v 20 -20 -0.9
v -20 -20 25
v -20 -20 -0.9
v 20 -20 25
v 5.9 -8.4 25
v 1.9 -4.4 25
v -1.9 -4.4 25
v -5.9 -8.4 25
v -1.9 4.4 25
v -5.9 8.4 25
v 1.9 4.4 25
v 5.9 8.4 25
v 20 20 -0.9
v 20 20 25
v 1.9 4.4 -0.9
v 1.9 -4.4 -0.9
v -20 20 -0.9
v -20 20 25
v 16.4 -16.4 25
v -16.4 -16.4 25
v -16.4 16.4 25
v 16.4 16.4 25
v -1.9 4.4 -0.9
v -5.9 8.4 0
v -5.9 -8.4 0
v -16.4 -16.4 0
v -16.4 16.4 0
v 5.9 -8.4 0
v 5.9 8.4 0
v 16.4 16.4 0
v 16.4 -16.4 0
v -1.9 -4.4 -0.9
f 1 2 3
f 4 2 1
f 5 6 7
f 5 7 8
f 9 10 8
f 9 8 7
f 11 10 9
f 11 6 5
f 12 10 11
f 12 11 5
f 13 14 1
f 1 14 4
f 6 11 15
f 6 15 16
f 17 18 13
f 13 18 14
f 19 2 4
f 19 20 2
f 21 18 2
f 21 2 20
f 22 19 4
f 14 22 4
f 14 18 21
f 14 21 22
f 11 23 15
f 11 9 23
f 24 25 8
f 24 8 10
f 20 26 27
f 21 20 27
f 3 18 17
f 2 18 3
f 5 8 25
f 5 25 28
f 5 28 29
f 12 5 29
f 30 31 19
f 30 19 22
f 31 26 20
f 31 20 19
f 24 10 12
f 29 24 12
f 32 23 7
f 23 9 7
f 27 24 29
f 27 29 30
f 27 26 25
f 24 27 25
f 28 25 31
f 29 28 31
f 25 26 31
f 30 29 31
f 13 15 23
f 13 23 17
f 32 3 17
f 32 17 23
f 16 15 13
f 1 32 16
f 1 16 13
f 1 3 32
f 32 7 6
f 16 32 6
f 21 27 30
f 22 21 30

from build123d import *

# Parameters (mm, degrees)
F0_W     = 40
F0_H     = 40
F0_W_2   = 32.8
F0_H_2   = 32.8
F1_DEPTH = 25
F2_W     = 11.8
F2_H     = 16.8
F2_W_2   = 3.8
F2_H_2   = 8.8
F3_DEPTH = 25
F4_W     = 40
F4_H     = 40
F4_W_2   = 3.8
F4_H_2   = 8.8
F5_DEPTH = 0.9


with BuildPart() as f1:
    # F0 (on Top) → F1 (new body)
    with BuildSketch(Plane.XY):
        Rectangle(F0_W, F0_H)
        Rectangle(F0_W_2, F0_H_2, mode=Mode.SUBTRACT)
    extrude(amount=F1_DEPTH)



with BuildPart() as f3:
    # F2 (on Top) → F3 (new body)
    with BuildSketch(Plane.XY):
        Rectangle(F2_W, F2_H)
        Rectangle(F2_W_2, F2_H_2, mode=Mode.SUBTRACT)
    extrude(amount=F3_DEPTH)


with BuildPart() as f1_1:
    add(f1.part)

    add(f3.part)  # F5 merges F3
    # F4 (on face) → F5 (join)
    with BuildSketch(Plane(origin=(0, 0, 0), x_dir=(1, 0, 0), z_dir=(0, 0, -1))):
        Rectangle(F4_W, F4_H)
        Rectangle(F4_W_2, F4_H_2, mode=Mode.SUBTRACT)
    extrude(amount=F5_DEPTH)


solid = f1_1.part
